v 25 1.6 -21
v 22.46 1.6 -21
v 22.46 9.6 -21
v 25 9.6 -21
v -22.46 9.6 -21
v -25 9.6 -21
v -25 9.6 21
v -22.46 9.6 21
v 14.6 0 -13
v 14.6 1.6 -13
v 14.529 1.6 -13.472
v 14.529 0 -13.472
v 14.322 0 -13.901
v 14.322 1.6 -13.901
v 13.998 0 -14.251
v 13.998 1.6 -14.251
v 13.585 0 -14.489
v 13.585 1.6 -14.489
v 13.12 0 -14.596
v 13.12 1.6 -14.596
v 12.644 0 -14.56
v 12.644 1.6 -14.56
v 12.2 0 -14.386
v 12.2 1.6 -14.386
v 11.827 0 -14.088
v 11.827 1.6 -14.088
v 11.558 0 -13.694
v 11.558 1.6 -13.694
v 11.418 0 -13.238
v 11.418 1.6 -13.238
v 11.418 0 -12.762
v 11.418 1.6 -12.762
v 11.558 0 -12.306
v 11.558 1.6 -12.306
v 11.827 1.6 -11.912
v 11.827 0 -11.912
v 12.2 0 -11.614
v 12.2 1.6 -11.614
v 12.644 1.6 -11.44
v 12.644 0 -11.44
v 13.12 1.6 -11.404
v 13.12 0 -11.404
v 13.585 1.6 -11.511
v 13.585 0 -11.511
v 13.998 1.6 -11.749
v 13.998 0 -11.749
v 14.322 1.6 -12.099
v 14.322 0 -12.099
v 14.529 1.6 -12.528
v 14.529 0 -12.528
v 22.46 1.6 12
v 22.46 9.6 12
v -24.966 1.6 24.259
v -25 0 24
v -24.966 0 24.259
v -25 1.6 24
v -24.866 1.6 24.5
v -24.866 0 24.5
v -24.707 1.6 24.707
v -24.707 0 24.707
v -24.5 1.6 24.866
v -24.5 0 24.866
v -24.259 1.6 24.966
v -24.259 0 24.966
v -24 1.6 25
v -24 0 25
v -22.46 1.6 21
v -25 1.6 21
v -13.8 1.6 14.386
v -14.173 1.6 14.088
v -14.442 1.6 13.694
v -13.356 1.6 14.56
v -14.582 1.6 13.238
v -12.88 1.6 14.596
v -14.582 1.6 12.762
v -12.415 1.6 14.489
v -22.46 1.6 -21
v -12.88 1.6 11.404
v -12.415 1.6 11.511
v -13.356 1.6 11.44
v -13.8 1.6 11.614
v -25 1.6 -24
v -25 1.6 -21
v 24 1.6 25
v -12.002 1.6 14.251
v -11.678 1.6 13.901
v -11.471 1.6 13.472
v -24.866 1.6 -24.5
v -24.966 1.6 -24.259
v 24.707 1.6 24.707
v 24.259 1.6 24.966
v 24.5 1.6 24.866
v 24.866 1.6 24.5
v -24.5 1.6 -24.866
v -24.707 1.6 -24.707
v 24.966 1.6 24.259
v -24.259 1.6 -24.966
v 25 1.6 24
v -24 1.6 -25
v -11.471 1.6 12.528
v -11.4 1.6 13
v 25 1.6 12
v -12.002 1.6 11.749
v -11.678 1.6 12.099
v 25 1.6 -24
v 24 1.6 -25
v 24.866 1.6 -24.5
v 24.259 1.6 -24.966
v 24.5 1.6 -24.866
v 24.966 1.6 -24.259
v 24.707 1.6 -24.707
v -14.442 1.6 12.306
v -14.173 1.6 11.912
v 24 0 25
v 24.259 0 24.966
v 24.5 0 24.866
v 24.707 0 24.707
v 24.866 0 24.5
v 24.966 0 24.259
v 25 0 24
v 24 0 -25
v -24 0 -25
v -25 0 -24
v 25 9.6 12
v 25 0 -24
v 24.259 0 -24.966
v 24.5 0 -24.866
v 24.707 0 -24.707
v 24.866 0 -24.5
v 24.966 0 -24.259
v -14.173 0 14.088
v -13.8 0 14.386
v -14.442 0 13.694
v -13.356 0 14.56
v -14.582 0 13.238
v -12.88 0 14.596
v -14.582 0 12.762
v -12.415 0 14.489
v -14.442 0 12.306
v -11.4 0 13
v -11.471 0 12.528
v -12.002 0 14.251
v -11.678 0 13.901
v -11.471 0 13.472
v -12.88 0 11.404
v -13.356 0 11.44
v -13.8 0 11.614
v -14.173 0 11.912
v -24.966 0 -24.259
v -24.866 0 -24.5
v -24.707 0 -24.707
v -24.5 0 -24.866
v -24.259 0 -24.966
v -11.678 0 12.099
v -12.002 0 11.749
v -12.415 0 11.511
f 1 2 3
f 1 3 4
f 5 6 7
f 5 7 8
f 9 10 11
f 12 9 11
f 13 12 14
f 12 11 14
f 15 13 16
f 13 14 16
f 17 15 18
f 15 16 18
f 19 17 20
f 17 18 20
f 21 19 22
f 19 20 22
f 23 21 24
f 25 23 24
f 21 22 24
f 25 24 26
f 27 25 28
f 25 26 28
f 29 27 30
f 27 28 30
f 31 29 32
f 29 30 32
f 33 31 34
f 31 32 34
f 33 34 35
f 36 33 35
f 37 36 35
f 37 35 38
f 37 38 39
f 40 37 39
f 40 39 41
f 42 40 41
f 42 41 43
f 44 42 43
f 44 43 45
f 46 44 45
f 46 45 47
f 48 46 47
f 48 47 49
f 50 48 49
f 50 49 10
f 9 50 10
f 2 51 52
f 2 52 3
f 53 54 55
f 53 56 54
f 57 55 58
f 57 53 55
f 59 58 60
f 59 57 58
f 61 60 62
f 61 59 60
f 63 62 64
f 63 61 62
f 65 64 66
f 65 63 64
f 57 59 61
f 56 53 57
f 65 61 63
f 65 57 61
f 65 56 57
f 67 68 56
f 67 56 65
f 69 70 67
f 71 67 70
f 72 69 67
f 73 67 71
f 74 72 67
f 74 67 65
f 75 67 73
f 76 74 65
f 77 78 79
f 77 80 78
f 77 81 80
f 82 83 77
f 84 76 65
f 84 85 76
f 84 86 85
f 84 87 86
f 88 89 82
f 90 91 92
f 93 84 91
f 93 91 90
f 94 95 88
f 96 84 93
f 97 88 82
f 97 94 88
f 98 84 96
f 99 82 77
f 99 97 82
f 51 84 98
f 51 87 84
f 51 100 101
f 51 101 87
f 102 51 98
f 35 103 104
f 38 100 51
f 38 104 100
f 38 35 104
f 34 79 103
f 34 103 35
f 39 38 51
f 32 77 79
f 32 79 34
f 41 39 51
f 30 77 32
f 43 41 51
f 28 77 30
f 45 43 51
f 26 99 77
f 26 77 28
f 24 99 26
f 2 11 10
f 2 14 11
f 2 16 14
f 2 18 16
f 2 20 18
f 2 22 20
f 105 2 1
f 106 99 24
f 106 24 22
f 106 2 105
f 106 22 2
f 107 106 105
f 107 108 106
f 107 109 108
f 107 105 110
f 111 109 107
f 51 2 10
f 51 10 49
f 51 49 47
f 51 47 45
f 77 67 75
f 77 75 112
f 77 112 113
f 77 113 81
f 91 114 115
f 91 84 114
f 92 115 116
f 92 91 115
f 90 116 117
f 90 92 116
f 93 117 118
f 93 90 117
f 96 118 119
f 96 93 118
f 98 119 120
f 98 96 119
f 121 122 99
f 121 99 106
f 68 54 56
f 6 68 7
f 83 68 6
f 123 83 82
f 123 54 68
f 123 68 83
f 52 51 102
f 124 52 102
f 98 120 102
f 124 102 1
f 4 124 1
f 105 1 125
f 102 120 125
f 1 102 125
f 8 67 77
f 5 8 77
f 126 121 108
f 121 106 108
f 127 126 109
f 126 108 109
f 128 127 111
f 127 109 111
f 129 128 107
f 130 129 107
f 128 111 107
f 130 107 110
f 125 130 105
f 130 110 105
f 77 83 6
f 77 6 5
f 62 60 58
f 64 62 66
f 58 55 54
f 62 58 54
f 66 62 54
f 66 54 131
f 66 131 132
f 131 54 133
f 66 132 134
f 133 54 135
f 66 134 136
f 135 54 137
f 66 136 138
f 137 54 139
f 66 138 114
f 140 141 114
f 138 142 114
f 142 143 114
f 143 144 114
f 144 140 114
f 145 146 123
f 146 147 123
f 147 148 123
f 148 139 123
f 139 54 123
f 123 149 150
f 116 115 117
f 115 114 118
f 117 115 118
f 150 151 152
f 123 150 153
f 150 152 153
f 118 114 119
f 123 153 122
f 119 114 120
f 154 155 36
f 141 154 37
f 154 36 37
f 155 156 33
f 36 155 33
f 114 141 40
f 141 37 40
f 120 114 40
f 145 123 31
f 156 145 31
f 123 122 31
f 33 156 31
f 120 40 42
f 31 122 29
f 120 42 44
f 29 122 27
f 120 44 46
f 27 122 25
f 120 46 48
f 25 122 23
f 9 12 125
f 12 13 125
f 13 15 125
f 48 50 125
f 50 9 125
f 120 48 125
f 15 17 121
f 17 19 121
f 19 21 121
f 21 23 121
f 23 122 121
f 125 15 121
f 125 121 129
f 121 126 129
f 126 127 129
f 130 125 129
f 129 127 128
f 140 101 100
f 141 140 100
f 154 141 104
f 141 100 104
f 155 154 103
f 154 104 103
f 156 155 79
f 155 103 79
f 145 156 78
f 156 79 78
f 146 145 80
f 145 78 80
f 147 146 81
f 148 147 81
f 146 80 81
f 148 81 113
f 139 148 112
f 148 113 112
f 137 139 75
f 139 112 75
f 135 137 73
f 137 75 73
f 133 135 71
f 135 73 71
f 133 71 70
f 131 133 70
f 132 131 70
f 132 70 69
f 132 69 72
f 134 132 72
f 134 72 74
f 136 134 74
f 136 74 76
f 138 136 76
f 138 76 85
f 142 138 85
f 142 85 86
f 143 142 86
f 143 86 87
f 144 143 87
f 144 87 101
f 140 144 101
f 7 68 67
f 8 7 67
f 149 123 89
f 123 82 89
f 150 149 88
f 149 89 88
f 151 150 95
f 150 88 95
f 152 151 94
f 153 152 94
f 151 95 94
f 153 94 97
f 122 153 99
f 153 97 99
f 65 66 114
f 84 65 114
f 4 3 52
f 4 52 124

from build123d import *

# Parameters (mm, degrees)
SKETCH1_W           = 50
SKETCH1_H           = 50
BOSS_EXTRUDE1_DEPTH = 1.6
SKETCH2_R           = 1.6
CUT_EXTRUDE1_DEPTH  = 2.6
FILLET1_R           = 1
SKETCH3_W           = 2.54
SKETCH3_H           = 42
SKETCH3_H_2         = 33
BOSS_EXTRUDE2_DEPTH = 8


with BuildPart() as part:
    # Sketch1 → Boss-Extrude1 (new body)
    with BuildSketch(Plane(origin=(0, 0, 0), x_dir=(1, 0, 0), z_dir=(0, 1, 0))):
        Rectangle(SKETCH1_W, SKETCH1_H)
    extrude(amount=BOSS_EXTRUDE1_DEPTH)

    # Sketch2 → Cut-Extrude1 (cut, through all)
    with BuildSketch(Plane(origin=(0, 1.6, 0), x_dir=(1, 0, 0), z_dir=(0, 1, 0))):
        with Locations((-13, -13)):
            Circle(SKETCH2_R)
        with Locations((13, 13)):
            Circle(SKETCH2_R)
    extrude(amount=-CUT_EXTRUDE1_DEPTH, mode=Mode.SUBTRACT)

    # Fillet1
    fillet1_edges = [part.edges().sort_by_distance(p)[0] for p in [
        (-25, 0.8, -25),
        (25, 0.8, -25),
        (25, 0.8, 25),
        (-25, 0.8, 25),
    ]]
    fillet(fillet1_edges, radius=FILLET1_R)

    # Sketch3 → Boss-Extrude2 (add)
    with BuildSketch(Plane(origin=(0, 1.6, 0), x_dir=(1, 0, 0), z_dir=(0, 1, 0))):
        with Locations((-23.73, 0)):
            Rectangle(SKETCH3_W, SKETCH3_H)
        with Locations((23.73, 4.5)):
            Rectangle(SKETCH3_W, SKETCH3_H_2)
    extrude(amount=BOSS_EXTRUDE2_DEPTH)


solid = part.part
